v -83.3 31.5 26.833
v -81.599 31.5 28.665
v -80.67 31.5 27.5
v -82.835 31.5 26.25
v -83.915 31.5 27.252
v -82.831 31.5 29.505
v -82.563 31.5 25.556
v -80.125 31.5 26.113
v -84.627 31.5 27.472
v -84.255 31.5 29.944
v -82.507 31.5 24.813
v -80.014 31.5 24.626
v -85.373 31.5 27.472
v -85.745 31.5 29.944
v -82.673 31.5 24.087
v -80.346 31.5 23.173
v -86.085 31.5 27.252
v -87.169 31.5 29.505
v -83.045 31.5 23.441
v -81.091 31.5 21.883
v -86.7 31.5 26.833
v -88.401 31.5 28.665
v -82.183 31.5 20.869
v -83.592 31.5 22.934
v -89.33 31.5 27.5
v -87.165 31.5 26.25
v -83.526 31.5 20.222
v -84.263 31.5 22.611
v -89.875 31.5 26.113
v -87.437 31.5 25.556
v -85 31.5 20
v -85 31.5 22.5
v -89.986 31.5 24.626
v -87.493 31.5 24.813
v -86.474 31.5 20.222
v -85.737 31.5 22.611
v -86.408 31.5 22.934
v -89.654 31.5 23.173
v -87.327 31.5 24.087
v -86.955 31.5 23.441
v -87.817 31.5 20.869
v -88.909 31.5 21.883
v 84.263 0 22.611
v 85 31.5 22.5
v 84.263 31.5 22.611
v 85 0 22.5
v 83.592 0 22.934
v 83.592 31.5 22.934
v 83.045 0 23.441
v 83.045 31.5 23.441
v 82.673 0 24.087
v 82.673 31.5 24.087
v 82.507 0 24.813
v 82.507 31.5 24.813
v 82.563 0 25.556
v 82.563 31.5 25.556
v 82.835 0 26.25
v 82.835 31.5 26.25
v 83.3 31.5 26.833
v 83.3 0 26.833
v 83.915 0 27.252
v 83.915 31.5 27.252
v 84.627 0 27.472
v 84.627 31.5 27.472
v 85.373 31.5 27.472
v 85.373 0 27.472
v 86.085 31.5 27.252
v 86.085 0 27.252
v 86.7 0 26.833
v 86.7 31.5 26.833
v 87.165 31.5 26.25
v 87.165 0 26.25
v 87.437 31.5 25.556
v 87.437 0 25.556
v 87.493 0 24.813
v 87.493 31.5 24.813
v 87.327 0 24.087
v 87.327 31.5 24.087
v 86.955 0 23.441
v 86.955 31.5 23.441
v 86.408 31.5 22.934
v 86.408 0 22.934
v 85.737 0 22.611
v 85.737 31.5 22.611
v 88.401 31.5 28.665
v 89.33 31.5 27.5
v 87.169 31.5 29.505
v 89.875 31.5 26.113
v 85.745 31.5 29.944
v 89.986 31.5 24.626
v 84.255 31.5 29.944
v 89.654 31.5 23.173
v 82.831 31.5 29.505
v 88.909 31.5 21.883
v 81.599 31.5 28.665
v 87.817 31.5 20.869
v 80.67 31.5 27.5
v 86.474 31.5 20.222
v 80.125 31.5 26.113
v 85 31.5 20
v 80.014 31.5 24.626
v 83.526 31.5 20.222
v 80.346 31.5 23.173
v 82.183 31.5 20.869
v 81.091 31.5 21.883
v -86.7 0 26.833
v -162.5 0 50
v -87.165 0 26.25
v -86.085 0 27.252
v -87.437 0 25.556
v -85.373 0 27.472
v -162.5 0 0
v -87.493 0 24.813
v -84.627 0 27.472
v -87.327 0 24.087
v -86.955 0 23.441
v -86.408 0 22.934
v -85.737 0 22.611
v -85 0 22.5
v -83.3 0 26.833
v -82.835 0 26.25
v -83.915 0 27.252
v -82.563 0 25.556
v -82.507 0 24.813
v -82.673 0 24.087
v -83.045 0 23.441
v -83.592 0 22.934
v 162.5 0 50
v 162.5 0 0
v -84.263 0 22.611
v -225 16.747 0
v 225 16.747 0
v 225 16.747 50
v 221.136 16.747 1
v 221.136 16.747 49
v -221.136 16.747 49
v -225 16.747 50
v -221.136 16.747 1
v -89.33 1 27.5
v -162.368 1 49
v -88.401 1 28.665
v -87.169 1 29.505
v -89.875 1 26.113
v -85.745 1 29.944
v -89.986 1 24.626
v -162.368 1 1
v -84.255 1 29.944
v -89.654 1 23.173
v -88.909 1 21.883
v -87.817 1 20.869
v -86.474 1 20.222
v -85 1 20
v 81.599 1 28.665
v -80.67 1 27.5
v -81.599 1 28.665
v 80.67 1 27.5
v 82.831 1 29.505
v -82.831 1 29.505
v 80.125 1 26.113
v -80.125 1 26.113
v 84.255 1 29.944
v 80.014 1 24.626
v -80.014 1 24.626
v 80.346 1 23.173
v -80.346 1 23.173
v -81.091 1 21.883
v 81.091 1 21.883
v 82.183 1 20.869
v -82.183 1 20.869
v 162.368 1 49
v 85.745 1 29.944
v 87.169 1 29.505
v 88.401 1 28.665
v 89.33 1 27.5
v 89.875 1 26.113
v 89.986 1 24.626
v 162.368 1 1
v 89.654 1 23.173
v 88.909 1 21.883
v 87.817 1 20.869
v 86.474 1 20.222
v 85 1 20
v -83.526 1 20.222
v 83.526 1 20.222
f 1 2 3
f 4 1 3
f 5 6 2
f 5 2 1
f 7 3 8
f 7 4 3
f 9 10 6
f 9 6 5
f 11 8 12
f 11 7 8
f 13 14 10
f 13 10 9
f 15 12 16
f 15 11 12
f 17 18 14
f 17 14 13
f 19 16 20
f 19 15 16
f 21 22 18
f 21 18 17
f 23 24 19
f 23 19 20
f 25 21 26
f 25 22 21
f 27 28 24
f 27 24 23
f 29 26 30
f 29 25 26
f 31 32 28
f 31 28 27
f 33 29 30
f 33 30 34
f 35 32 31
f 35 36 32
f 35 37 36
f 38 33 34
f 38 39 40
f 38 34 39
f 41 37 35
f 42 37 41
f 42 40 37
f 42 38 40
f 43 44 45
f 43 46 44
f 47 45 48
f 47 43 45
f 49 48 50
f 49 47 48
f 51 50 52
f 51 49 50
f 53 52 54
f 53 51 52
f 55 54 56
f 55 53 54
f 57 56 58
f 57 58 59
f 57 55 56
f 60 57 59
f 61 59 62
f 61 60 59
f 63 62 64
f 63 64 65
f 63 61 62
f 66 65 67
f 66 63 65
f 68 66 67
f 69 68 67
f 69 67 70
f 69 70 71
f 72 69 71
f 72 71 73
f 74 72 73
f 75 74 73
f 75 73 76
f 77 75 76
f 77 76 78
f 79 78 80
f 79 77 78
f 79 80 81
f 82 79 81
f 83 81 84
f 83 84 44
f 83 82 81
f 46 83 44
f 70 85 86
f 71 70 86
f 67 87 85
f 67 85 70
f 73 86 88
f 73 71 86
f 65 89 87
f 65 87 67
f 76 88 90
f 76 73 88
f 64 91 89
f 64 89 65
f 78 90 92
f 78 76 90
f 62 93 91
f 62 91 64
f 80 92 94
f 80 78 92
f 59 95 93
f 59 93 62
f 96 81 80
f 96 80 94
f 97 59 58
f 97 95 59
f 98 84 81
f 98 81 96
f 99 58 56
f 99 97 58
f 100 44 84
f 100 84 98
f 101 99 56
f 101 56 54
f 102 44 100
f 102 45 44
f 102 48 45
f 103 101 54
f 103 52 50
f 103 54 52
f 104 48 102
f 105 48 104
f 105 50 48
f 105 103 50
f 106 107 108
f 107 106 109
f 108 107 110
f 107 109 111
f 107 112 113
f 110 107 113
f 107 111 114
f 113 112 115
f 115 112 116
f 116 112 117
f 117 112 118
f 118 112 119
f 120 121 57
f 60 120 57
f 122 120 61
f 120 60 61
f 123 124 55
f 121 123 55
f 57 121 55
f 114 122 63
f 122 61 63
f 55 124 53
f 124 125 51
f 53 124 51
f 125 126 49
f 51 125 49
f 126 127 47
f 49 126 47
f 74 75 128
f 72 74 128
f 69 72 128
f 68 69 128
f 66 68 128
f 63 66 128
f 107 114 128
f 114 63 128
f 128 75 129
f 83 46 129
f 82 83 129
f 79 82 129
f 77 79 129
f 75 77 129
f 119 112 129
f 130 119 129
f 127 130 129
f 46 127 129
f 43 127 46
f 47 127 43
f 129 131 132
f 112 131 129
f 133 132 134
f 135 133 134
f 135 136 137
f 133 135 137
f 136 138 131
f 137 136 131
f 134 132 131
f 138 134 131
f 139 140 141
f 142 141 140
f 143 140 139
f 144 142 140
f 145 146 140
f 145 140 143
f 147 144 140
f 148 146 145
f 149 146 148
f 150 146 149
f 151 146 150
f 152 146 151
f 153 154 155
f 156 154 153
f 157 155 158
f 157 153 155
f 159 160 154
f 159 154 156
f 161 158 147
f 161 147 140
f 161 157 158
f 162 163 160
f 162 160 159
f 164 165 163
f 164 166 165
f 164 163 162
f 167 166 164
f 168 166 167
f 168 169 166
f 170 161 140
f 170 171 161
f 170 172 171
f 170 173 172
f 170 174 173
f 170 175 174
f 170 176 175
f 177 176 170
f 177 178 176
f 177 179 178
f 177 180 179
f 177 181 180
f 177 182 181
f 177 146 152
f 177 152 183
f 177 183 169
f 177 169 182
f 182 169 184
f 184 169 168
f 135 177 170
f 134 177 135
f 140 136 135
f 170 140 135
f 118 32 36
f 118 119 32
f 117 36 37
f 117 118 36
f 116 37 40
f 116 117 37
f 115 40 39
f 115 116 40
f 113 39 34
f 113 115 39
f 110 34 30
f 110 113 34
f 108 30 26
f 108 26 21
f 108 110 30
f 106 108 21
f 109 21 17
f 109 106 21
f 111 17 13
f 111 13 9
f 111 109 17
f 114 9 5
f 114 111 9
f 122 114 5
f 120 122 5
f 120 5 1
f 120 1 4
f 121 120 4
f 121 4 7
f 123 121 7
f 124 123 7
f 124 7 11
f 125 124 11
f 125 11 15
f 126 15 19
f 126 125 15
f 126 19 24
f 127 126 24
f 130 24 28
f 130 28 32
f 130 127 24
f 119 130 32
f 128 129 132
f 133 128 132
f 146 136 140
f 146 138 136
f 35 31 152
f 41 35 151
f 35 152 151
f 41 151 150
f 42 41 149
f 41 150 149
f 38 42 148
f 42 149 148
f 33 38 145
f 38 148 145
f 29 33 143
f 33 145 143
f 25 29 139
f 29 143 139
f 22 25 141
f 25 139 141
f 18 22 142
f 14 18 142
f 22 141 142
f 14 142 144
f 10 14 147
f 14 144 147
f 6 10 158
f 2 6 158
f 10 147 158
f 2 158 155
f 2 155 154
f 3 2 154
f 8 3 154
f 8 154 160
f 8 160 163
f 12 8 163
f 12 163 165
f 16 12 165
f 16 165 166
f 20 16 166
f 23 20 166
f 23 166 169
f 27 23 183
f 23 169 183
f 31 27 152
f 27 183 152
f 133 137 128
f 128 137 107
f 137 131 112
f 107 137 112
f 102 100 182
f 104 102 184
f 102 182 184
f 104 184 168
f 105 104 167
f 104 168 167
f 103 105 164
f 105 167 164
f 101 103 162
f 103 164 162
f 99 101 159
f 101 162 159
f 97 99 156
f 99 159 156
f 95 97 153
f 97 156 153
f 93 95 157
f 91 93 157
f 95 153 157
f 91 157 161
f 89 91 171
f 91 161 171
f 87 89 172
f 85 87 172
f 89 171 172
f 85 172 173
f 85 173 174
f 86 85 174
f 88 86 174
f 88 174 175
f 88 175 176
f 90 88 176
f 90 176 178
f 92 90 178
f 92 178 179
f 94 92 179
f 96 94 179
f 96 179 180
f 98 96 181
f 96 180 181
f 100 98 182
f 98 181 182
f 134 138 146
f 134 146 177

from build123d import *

# Parameters (mm, degrees)
BOSS_EXTRUDE1_DEPTH = 50
SHELL1_T            = -1
SKETCH2_R           = 2.5
CUT_EXTRUDE1_DEPTH  = 50
SKETCH3_R           = 5
SKETCH3_R_2         = 2.5
BOSS_EXTRUDE2_DEPTH = 30.5


with BuildPart() as part:
    # Sketch1 → Boss-Extrude1 (new body)
    with BuildSketch(Plane.XY):
        Polygon((-162.5, 0), (162.5, 0), (225, 16.746824527), (-225, 16.746824527), align=None)
    extrude(amount=BOSS_EXTRUDE1_DEPTH)

    # Shell1
    shell1_openings = [part.faces().sort_by_distance(p)[0] for p in [
        (0, 16.746824527, 25),
    ]]
    offset(amount=SHELL1_T, openings=shell1_openings, kind=Kind.INTERSECTION)

    # Sketch2 → Cut-Extrude1 (cut)
    with BuildSketch(Plane.XZ):
        with Locations(Location((-85, 25, 0), (0, 0, 270))):
            Circle(SKETCH2_R)
        with Locations(Location((85, 25, 0), (0, 0, 270))):
            Circle(SKETCH2_R)
    extrude(amount=-CUT_EXTRUDE1_DEPTH, mode=Mode.SUBTRACT)

    # Sketch3 → Boss-Extrude2 (add)
    # profile 1 of 2: a face of its own
    with BuildSketch(Plane(origin=(0, 1, 0), x_dir=(1, 0, 0), z_dir=(0, 1, 0))):
        with Locations(Location((-85, -25, 0), (0, 0, 90))):
            Circle(SKETCH3_R)
        with Locations(Location((-85, -25, 0), (0, 0, 90))):
            Circle(SKETCH3_R_2, mode=Mode.SUBTRACT)
    # profile 2 of 2: a face of its own
    with BuildSketch(Plane(origin=(0, 1, 0), x_dir=(1, 0, 0), z_dir=(0, 1, 0))):
        with Locations(Location((85, -25, 0), (0, 0, 90))):
            Circle(SKETCH3_R)
        with Locations(Location((85, -25, 0), (0, 0, 90))):
            Circle(SKETCH3_R_2, mode=Mode.SUBTRACT)
    extrude(amount=BOSS_EXTRUDE2_DEPTH)


solid = part.part
